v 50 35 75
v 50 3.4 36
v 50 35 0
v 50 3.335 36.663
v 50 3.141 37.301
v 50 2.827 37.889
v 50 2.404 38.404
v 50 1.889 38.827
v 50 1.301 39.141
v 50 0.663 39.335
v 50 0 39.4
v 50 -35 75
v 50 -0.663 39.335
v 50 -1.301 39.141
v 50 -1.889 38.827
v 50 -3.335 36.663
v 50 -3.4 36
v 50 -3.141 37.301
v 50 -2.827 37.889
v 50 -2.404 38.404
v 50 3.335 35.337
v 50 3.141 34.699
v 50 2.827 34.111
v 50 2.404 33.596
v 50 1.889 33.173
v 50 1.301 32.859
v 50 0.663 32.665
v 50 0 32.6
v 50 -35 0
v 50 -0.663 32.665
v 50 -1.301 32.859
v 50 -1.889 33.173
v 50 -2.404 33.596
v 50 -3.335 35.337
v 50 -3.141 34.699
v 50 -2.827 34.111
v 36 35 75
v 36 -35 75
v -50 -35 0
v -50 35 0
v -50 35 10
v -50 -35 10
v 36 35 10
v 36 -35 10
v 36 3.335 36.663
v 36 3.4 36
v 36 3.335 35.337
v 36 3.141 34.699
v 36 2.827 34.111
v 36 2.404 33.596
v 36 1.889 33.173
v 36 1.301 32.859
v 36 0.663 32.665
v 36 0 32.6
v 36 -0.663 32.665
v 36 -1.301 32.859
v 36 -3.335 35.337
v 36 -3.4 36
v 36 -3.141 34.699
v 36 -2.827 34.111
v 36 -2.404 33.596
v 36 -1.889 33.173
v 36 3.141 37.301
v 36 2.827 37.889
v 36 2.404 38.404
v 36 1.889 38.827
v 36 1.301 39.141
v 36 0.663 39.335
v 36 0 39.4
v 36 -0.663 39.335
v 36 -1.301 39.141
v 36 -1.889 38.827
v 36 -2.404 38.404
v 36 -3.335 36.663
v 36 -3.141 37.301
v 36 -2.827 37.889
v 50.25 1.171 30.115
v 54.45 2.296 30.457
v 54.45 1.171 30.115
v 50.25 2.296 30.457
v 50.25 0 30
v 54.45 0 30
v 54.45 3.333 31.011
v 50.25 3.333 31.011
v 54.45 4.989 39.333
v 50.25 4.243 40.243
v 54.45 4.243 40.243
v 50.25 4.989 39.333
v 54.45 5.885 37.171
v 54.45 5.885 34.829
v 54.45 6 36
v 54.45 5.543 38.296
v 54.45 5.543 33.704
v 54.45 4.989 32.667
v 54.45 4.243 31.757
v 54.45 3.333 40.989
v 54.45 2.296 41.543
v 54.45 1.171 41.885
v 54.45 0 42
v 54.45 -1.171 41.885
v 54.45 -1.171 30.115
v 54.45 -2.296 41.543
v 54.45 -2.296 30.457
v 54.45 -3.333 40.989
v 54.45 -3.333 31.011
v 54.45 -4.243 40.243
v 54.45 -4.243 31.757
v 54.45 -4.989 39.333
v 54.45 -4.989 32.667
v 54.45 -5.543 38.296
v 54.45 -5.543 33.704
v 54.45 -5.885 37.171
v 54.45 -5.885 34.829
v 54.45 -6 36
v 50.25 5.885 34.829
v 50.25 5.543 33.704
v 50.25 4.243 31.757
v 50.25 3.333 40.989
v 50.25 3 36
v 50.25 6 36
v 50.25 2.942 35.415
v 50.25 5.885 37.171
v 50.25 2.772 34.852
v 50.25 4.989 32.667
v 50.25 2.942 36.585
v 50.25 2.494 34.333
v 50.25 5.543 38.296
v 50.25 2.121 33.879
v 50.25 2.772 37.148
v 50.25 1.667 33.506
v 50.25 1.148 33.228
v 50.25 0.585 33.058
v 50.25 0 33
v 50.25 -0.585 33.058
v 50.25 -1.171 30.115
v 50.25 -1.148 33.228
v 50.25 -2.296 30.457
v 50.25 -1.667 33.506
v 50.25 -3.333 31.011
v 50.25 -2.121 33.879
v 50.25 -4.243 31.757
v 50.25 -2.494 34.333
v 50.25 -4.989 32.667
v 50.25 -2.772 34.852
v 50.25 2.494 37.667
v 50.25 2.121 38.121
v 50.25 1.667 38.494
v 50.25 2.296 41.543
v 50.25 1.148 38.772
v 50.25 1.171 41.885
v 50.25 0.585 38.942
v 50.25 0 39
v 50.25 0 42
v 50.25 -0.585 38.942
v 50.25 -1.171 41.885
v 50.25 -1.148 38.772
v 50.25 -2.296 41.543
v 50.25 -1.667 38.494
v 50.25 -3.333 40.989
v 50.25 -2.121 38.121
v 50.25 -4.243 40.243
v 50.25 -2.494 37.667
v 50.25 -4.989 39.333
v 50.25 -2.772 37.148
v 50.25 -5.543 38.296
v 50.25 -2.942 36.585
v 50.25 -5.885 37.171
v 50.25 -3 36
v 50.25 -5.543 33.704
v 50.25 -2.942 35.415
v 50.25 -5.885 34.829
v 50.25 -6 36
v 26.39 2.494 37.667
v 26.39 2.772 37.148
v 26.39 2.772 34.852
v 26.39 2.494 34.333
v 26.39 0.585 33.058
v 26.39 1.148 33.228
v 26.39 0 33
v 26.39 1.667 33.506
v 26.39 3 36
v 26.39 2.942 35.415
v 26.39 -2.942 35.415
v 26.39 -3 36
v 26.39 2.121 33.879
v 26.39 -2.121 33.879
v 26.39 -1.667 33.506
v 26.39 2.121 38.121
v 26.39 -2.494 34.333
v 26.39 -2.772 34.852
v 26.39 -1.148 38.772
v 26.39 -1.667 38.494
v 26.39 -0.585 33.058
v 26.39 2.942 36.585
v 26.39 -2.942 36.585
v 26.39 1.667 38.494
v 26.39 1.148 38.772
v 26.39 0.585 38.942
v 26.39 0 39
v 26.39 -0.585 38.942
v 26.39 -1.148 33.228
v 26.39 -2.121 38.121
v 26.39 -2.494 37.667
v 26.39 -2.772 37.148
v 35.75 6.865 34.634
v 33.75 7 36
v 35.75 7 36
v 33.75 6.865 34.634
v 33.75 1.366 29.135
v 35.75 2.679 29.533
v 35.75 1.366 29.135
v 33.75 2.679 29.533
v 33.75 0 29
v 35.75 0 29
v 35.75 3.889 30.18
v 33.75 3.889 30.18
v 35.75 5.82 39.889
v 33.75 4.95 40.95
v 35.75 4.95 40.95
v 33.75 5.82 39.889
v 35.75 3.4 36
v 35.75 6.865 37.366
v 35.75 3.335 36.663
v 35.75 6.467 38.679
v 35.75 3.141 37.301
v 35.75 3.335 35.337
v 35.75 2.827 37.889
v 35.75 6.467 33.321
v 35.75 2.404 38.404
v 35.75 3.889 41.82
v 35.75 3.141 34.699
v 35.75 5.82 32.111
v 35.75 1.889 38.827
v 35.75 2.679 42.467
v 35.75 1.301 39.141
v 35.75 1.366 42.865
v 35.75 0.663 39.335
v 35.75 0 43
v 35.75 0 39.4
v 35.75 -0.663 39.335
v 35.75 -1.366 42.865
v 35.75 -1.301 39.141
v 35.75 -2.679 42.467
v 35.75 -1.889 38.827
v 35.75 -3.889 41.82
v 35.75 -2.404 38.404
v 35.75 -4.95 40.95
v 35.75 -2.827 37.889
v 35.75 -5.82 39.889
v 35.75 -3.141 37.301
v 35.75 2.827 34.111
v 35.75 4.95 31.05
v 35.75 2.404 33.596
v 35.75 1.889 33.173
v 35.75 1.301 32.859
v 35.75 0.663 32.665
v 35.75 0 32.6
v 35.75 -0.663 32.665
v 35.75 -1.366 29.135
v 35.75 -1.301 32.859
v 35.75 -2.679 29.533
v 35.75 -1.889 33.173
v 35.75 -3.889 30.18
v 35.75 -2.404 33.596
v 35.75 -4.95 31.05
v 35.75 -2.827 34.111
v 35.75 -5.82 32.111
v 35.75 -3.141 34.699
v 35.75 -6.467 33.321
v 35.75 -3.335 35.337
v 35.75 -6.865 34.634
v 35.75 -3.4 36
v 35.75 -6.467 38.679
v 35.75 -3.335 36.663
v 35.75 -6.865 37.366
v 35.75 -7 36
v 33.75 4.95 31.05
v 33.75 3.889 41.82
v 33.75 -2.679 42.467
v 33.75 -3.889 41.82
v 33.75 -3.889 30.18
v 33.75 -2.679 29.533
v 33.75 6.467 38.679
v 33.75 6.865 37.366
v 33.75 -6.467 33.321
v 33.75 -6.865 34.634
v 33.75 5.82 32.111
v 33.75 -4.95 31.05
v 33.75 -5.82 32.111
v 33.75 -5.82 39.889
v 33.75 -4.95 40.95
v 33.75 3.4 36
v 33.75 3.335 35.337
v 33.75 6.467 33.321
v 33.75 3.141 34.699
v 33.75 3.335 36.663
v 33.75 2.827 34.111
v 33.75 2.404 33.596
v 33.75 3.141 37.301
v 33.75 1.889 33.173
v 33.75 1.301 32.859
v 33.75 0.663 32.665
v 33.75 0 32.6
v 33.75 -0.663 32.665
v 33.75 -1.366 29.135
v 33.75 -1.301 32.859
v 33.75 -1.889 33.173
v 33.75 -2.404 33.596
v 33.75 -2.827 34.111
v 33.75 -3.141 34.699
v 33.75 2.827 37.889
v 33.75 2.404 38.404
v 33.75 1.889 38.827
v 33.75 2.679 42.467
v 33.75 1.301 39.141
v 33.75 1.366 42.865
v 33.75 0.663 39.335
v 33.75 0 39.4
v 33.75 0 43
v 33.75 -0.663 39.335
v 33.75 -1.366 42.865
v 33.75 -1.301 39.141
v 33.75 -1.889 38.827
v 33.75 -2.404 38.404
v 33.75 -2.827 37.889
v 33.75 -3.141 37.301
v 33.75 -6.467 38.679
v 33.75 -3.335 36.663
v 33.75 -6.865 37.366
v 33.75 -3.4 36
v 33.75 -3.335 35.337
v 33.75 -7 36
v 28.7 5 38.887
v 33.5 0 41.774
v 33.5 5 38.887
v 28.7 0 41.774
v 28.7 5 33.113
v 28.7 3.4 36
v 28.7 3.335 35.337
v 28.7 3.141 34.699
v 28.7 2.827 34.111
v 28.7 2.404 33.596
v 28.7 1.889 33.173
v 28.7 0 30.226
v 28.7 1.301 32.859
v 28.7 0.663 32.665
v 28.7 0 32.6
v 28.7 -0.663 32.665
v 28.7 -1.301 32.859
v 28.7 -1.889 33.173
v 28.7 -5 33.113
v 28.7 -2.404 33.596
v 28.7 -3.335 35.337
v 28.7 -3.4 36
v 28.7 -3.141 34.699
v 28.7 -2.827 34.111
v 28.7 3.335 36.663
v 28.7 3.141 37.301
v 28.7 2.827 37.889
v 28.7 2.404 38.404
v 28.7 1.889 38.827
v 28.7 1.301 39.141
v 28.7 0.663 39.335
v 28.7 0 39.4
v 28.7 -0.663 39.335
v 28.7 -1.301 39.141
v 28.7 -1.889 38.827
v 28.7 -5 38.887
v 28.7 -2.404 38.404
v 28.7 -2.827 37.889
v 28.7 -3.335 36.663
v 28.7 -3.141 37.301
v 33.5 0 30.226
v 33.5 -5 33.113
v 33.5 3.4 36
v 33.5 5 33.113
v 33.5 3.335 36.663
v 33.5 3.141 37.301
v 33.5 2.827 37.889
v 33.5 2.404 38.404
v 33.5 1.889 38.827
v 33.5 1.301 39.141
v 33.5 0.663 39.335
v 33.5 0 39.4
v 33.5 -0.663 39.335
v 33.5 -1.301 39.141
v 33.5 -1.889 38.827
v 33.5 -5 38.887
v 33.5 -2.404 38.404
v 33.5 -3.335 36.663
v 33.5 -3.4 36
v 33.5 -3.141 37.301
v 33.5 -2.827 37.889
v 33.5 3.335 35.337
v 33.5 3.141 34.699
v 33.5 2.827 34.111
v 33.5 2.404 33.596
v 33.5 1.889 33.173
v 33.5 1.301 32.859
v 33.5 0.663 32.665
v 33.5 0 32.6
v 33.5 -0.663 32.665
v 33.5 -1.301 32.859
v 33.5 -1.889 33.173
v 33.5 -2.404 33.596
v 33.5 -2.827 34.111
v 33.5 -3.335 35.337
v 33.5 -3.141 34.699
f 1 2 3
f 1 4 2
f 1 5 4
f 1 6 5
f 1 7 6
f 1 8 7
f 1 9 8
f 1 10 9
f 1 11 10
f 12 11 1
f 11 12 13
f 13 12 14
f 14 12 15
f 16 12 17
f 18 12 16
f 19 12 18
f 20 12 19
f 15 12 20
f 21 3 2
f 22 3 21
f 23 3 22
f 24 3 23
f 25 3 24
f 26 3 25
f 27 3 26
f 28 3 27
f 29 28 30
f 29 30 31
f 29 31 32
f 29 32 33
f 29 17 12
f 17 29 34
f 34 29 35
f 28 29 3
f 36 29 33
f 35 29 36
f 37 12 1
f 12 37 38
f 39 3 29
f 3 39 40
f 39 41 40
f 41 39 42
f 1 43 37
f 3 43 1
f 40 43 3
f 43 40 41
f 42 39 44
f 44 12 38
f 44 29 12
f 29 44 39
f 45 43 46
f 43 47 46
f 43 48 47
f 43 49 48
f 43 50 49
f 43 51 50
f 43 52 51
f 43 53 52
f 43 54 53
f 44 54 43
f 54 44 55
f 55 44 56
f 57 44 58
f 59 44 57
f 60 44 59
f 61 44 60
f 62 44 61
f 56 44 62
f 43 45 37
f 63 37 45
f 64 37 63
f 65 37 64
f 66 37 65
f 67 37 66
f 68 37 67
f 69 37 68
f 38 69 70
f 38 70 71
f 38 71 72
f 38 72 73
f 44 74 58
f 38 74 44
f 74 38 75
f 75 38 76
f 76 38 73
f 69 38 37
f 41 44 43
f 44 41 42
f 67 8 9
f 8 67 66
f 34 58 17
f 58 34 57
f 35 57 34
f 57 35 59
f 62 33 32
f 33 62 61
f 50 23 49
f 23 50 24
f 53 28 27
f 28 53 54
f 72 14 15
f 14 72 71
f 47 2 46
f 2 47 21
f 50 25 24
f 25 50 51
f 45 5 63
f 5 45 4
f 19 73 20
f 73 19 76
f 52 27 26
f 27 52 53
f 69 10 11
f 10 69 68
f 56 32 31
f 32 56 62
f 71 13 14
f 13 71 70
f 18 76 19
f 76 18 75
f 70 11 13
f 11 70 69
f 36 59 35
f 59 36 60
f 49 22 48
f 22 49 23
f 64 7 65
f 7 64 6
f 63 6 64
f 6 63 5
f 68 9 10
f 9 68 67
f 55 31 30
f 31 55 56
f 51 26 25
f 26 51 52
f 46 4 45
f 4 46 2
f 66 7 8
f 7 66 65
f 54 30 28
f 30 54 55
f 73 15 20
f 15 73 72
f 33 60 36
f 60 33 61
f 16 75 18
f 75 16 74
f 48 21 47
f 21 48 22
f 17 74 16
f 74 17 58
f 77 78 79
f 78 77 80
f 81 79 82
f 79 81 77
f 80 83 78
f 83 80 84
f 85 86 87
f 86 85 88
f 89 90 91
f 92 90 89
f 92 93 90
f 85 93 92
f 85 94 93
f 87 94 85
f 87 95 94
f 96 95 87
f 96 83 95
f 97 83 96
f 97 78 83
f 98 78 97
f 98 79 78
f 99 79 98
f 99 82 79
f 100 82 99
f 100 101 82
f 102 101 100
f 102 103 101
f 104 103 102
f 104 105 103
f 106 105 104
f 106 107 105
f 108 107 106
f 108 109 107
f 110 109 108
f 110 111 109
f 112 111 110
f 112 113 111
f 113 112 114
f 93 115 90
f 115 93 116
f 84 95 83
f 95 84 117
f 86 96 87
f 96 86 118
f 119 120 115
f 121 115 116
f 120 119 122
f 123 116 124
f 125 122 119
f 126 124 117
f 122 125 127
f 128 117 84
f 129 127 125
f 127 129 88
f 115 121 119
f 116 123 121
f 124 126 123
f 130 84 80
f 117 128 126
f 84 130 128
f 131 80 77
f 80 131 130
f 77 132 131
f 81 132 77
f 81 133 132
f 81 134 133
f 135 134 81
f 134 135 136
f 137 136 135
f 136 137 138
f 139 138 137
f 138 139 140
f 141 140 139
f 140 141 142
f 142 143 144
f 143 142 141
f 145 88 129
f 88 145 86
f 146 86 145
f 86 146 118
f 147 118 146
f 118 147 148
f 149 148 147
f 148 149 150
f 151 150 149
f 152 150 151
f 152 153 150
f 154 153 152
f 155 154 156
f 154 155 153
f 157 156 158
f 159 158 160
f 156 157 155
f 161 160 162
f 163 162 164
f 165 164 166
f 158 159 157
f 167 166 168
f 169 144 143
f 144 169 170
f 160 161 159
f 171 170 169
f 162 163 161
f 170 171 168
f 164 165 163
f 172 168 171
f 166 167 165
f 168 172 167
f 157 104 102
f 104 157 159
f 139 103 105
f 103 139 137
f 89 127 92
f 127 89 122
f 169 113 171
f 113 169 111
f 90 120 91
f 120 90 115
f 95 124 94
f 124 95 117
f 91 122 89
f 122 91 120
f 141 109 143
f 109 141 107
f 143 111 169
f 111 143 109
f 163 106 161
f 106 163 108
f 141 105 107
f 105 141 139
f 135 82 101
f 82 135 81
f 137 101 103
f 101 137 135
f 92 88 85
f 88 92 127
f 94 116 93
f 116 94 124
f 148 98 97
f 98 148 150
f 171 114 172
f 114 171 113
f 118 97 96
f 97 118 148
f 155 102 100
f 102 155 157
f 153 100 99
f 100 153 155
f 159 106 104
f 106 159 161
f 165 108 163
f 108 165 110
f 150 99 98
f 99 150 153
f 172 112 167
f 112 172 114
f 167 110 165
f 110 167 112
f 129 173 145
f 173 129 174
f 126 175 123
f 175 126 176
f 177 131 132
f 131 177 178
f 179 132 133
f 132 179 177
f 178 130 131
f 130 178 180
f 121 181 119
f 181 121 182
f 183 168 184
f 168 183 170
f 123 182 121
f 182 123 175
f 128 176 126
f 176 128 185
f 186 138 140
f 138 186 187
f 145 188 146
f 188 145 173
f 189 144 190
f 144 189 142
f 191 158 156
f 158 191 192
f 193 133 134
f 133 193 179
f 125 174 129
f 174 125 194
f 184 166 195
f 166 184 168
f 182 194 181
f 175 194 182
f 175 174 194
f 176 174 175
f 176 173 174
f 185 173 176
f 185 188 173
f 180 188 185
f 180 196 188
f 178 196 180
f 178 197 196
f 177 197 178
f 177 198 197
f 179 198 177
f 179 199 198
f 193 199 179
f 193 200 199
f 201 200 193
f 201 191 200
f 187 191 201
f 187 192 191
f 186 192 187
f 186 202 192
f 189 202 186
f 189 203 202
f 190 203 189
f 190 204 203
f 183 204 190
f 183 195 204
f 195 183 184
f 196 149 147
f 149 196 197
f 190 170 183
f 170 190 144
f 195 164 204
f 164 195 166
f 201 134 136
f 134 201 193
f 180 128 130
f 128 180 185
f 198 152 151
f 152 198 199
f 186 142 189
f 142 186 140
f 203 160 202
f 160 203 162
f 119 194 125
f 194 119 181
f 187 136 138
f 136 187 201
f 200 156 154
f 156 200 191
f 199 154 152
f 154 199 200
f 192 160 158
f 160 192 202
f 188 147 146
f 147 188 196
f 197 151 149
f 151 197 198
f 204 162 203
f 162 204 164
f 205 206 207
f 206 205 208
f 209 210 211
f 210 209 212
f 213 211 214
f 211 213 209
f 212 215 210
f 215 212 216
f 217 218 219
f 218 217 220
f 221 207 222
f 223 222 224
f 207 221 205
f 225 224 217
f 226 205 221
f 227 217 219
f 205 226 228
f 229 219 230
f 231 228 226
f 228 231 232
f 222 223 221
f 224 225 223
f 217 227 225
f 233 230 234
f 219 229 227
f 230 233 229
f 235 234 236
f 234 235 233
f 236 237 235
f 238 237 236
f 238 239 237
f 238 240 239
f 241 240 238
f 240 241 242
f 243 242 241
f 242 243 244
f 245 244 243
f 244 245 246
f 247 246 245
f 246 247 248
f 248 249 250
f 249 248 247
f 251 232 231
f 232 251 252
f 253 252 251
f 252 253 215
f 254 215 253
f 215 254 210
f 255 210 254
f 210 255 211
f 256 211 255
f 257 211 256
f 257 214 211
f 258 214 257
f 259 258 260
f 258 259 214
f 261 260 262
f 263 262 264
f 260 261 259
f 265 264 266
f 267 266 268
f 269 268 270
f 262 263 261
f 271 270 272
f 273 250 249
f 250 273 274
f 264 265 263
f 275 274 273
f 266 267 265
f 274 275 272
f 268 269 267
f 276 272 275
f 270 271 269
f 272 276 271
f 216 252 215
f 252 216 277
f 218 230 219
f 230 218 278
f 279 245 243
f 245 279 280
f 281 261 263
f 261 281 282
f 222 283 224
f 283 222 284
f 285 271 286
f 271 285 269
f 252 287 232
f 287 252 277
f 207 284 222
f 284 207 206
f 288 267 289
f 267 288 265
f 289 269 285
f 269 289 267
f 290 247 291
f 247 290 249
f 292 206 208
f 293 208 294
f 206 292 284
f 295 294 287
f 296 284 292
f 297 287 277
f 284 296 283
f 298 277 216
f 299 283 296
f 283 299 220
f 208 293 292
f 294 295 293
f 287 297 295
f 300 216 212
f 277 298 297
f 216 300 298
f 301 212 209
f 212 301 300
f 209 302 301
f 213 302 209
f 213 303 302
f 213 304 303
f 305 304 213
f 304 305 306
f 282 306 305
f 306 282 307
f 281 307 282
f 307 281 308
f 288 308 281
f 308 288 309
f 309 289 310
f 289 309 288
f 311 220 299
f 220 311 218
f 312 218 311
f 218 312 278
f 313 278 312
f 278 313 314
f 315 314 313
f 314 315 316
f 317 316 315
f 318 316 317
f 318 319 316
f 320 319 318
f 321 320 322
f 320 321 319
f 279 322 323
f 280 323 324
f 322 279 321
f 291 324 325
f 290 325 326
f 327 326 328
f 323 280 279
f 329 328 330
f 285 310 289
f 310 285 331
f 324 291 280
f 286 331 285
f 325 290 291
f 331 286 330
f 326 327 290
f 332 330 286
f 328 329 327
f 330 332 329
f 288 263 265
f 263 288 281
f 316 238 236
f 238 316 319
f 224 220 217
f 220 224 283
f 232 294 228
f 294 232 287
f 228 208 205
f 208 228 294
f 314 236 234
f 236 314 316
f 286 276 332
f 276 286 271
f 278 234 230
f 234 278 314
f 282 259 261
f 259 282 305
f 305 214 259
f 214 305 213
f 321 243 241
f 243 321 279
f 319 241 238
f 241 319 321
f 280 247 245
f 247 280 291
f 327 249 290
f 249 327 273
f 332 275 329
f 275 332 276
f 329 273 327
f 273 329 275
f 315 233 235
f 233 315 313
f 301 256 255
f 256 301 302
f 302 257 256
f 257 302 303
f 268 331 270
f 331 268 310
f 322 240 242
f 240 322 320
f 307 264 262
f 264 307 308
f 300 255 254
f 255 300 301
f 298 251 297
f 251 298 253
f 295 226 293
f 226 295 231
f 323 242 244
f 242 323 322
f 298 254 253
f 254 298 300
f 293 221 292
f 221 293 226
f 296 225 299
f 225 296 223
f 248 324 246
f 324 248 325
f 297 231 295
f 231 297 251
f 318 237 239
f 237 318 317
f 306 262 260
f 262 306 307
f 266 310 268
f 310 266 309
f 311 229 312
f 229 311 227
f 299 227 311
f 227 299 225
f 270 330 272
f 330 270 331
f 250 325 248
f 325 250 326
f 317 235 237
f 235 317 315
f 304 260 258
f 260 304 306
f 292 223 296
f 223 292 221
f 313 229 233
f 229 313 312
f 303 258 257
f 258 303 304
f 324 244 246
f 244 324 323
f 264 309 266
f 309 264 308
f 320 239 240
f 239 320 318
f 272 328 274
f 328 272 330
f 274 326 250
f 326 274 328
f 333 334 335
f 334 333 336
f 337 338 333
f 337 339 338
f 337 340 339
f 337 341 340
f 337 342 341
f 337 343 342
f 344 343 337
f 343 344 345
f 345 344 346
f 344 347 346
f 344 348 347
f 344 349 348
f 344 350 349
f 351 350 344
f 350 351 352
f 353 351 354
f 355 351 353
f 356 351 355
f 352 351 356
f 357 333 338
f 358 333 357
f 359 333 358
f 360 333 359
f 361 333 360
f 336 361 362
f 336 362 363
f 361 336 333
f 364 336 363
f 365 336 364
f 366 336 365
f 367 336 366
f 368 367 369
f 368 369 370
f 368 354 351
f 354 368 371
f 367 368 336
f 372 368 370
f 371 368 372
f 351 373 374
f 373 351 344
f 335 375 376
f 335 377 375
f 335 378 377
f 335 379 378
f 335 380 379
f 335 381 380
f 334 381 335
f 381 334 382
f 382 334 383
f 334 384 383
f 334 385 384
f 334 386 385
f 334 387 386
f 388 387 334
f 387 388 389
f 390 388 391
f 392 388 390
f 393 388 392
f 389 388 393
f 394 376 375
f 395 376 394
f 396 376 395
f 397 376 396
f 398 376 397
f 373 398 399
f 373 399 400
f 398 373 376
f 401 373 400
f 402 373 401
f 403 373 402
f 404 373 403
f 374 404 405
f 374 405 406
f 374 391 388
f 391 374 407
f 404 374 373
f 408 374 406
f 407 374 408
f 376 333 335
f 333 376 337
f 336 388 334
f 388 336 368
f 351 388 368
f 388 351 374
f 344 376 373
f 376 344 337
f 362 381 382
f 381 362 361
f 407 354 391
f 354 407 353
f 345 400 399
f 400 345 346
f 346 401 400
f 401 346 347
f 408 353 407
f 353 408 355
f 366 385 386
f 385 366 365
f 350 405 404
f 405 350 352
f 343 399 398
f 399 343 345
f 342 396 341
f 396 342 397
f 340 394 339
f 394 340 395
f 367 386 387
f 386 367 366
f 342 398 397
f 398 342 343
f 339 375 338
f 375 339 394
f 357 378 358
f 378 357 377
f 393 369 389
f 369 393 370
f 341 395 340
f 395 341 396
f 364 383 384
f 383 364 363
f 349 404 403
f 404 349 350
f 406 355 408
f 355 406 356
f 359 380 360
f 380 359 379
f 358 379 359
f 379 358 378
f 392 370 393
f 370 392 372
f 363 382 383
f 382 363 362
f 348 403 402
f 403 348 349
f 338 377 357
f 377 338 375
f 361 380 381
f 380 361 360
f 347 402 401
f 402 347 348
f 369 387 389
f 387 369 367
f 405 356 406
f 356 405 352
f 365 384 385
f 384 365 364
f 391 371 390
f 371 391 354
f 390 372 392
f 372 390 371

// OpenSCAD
$fn = 32;

// ------------------------------------------------------------------------
// Bolted bracket: 100 x 70 mm bracket with 1 bolt joints
// Every part is its own module, assembly() places them once.
// ------------------------------------------------------------------------

// --- part 1 ---
module bracket() {
  difference() {
    translate([-50, -35, 0]) cube([100, 70, 75]);
    translate([-51, -36, 10]) cube([87, 72, 66]);
    translate([43, 0, 36]) rotate([0, 90, 0]) cylinder(h = 16, d = 6.8, center = true);
  }
}

// --- part 2 ---
module bolt() {
  cylinder(h = 4.2, d = 12);
  translate([0, 0, -23.86]) cylinder(h = 23.86, d = 6);
}

// --- part 3 ---
module washer() {
  difference() {
      translate([0, 0, 0]) cylinder(h = 2, d = 14);
      translate([0, 0, -1]) cylinder(h = 4, d = 6.8);
    }
}

// --- part 4 ---
module nut() {
  difference() {
    linear_extrude(height = 4.8) polygon(points = [[5.774, 0], [2.887, 5], [-2.887, 5], [-5.774, 0], [-2.887, -5], [2.887, -5]]);
    translate([0, 0, -1]) cylinder(h = 6.8, d = 6.8);
  }
}

// --- assembly ---
module assembly() {
  translate([0, 0, 0]) rotate([0, 0, 0]) bracket();
  translate([50.25, 0, 36]) rotate([0, 90, 0]) bolt();
  translate([33.75, 0, 36]) rotate([0, 90, 0]) washer();
  translate([28.7, 0, 36]) rotate([0, 90, 0]) nut();
}

assembly();
